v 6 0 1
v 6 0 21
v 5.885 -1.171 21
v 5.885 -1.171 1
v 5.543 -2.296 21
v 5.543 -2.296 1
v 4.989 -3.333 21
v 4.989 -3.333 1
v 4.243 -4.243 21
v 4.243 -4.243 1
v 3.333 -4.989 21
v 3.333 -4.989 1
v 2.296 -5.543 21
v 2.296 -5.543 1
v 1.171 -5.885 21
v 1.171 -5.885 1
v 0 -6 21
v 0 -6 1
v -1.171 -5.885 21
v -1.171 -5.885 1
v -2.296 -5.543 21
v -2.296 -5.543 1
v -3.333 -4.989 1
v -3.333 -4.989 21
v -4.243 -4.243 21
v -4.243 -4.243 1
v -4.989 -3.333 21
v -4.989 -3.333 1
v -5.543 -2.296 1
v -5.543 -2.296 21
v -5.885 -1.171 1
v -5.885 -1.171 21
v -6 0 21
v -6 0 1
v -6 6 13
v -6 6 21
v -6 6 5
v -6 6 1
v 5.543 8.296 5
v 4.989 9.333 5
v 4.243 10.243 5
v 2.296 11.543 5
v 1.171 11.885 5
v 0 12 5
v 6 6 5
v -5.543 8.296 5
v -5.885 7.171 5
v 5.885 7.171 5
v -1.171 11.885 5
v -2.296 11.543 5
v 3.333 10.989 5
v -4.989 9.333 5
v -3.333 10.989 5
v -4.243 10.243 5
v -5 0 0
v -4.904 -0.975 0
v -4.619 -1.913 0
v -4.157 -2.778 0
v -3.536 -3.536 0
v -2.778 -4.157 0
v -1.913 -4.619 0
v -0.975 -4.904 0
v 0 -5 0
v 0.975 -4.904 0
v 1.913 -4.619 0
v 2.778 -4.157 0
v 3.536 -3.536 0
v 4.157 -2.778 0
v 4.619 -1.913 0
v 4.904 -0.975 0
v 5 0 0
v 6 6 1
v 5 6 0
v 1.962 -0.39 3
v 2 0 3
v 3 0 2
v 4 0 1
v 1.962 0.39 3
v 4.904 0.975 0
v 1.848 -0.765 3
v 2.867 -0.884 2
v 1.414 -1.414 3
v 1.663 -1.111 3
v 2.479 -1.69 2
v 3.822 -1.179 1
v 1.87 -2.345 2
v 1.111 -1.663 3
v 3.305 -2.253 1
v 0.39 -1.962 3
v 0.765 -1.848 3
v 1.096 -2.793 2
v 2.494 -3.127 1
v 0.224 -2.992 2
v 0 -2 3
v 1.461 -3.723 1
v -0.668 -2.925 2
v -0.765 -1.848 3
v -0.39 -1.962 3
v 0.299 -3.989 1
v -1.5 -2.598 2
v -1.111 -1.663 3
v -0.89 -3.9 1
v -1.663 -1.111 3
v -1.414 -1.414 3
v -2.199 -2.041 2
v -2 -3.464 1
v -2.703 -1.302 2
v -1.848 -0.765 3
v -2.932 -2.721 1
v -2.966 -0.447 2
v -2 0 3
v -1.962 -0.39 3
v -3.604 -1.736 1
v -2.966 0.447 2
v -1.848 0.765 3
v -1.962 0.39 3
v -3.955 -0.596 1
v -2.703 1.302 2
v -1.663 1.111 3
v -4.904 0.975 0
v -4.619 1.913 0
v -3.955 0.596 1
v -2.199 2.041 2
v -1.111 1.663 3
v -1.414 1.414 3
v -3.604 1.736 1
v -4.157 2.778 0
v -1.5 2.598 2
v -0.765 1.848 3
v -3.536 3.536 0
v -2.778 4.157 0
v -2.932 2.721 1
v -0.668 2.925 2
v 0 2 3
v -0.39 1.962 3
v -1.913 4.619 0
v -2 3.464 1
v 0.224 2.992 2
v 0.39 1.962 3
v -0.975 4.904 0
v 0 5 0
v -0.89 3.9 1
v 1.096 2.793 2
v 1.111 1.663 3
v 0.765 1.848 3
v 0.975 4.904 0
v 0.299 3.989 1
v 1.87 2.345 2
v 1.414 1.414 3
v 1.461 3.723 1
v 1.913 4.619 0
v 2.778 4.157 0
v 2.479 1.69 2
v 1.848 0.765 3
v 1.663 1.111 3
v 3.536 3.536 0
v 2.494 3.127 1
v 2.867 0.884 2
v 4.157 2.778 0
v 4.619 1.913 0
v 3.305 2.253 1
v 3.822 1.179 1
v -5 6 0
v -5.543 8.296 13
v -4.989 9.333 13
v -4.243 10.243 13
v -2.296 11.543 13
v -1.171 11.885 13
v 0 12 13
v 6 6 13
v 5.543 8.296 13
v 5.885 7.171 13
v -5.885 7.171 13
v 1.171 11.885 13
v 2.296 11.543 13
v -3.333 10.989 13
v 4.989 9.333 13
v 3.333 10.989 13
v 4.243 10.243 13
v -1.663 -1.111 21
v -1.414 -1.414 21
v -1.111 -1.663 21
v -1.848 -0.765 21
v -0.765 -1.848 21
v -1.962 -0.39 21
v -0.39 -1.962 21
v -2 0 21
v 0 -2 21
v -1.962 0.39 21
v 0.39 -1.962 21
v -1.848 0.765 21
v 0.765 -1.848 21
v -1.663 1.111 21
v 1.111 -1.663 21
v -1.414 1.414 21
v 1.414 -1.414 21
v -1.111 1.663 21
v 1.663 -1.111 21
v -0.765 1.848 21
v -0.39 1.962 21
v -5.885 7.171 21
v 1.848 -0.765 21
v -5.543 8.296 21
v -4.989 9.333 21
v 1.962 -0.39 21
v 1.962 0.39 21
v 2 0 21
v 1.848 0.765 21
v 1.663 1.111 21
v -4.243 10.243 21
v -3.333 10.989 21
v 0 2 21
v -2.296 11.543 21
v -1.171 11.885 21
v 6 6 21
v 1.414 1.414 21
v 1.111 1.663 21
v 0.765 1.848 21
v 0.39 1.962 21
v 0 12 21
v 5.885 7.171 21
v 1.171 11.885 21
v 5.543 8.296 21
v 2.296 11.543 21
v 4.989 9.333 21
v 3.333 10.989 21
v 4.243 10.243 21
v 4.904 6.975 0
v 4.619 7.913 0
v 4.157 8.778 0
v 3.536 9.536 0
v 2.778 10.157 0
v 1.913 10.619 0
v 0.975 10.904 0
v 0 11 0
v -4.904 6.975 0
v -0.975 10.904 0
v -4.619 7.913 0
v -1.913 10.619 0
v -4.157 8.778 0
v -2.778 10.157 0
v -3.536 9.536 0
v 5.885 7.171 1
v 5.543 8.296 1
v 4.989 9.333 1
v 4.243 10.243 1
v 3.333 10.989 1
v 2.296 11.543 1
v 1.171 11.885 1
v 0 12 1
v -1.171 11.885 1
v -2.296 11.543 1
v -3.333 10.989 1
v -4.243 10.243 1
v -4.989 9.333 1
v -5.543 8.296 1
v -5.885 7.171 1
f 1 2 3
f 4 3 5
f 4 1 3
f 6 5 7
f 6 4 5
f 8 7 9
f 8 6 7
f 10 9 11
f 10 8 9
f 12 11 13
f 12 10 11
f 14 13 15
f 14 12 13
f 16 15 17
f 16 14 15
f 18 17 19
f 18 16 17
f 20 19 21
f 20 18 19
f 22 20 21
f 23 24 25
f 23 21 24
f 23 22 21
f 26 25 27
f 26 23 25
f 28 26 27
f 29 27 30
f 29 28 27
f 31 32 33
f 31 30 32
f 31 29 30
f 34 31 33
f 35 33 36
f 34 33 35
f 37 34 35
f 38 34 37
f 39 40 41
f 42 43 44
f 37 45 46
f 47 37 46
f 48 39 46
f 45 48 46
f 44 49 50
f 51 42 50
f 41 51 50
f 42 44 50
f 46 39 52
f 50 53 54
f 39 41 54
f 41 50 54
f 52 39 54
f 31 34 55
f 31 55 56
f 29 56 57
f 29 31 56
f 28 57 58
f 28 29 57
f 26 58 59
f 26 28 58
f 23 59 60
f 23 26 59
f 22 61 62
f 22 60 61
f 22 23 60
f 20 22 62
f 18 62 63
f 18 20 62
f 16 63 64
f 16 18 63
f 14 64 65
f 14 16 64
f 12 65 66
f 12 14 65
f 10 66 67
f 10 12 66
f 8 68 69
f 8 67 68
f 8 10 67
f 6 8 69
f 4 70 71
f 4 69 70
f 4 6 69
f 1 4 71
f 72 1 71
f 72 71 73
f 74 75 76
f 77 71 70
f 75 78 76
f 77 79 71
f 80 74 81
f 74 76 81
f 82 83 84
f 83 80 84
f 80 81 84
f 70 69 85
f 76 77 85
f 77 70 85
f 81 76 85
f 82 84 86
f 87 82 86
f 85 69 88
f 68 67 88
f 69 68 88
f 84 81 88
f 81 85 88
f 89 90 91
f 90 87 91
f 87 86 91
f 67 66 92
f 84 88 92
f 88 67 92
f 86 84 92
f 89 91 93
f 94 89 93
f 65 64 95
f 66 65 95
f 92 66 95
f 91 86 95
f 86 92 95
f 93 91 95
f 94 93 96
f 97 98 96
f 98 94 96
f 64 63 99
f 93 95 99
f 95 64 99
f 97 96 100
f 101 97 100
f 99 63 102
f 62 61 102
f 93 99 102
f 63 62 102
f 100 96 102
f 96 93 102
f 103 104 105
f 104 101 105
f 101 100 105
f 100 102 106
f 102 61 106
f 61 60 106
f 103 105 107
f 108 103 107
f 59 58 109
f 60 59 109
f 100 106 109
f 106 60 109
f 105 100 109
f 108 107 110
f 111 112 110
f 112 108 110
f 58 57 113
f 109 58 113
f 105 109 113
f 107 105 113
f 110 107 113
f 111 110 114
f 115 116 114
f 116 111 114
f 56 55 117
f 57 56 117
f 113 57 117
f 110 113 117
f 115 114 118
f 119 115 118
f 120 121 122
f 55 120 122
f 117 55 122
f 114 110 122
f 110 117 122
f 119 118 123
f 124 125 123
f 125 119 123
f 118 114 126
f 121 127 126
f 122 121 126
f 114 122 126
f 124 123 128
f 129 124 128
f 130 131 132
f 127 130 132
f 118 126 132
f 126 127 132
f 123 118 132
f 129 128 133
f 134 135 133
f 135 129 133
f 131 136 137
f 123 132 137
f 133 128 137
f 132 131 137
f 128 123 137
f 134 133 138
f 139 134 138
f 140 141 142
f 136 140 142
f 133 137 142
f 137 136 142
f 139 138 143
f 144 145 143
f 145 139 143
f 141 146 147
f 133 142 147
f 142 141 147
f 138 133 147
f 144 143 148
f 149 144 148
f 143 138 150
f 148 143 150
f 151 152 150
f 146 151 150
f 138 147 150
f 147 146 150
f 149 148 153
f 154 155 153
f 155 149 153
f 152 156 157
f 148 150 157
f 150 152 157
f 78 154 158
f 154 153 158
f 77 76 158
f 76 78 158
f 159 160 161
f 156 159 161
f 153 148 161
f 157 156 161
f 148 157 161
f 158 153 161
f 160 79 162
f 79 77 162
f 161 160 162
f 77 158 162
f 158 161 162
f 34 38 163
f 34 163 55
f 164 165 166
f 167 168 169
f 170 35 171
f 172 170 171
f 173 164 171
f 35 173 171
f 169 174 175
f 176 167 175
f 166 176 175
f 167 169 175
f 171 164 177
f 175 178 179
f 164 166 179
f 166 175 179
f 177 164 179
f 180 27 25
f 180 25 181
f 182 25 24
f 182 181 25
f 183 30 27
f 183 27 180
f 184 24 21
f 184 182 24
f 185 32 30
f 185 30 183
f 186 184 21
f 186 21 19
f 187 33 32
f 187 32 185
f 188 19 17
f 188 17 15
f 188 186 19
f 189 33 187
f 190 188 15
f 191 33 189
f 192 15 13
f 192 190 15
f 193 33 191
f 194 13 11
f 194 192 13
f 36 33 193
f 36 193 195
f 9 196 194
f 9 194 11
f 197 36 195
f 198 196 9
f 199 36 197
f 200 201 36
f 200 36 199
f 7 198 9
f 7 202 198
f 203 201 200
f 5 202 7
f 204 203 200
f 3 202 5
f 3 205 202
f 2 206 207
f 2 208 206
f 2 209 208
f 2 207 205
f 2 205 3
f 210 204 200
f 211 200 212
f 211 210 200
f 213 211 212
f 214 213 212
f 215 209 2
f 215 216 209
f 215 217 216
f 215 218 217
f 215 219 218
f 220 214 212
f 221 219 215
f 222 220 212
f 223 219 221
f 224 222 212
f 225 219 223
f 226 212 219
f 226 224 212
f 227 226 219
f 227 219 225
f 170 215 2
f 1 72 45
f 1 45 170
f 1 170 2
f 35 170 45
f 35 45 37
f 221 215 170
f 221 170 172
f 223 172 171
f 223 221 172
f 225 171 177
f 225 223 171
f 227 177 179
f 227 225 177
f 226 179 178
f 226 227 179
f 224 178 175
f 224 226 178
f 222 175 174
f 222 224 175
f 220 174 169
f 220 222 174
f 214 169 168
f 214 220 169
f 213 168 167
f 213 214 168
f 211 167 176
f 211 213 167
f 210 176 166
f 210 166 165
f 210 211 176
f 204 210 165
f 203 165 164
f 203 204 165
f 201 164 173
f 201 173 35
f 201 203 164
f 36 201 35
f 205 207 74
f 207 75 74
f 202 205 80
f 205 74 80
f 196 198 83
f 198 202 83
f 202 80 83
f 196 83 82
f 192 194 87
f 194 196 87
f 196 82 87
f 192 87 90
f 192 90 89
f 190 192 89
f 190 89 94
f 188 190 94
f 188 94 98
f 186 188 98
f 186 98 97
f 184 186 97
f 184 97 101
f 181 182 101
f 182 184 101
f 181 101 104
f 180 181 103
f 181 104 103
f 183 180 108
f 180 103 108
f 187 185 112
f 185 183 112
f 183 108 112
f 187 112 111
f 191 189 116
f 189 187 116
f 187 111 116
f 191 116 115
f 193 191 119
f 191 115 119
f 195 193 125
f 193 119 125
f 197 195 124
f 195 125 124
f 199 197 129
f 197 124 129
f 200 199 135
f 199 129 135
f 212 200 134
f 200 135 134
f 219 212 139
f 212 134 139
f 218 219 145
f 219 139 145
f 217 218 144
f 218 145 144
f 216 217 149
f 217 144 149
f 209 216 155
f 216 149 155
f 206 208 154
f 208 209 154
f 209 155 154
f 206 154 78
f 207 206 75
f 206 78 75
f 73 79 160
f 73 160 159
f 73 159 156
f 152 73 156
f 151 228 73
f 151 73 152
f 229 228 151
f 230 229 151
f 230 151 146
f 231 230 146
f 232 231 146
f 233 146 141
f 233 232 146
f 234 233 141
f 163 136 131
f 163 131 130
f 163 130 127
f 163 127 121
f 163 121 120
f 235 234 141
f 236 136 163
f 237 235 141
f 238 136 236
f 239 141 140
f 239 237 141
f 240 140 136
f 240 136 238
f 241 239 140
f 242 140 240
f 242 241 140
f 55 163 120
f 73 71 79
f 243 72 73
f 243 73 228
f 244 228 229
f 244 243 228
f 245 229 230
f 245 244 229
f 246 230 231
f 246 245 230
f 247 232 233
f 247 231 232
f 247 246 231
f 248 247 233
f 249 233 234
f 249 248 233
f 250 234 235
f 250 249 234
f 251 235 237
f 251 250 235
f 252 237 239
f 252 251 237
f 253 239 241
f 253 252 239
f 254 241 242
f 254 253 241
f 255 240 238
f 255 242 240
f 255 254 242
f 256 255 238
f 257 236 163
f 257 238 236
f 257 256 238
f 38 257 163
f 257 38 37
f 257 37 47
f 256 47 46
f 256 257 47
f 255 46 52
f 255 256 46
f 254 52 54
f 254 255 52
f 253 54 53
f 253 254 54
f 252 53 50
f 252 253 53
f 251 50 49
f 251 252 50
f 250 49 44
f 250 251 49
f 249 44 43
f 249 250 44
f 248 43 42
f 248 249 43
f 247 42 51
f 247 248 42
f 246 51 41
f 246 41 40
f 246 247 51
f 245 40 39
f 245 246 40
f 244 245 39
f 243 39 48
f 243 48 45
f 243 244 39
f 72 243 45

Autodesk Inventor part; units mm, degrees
ref_plane "YZ Plane" through (0, 0, 0) normal (1, 0, 0) x (0, 1, 0)
ref_plane "XZ Plane" through (0, 0, 0) normal (0, 1, 0) x (-1, 0, 0)
ref_plane "XY Plane" through (0, 0, 0) normal (0, 0, 1) x (1, 0, 0)
sketch "Sketch2" plane through (0, 0, 0) normal (0, 0, 1) x (1, 0, 0)
  circle A0 centre (0, 0) radius 6
  circle A1 centre (0, 0) radius 2
  dimension "d0" = 12
  dimension "d1" = 4
extrude "Extrusion1" add sketch "Sketch2" along normal blind 21
sketch "Sketch3" plane through (0, 0, 21) normal (0, 0, 1) x (1, 0, 0)
  line L0 (0, 0) -> (0, 6) construction
  line L1 (6, 0) -> (6, 6)
  line L2 (-6, 6) -> (-6, 0)
  arc A0 (-6, 0) -> (6, 0) centre (0, 0) ccw
  arc A1 (6, 6) -> (-6, 6) centre (0, 6) ccw
  circle A2 centre (0, 0) radius 2 projected
  circle A3 centre (0, 0) radius 6 projected
  circle A4 centre (0, 0) radius 2 projected
  circle A5 centre (0, 0) radius 6 projected
  point P0 (0, 3)
  dimension "d4" = 6
  dimension "d5" = 6
extrude "Extrusion2" add sketch "Sketch3" against normal blind 8 contours A3 L2 A1 L1
sketch "Sketch4" plane through (0, 0, 0) normal (0, 0, -1) x (-1, 0, 0)
  arc A0 (6, 6) -> (-6, 6) centre (0, 6) ccw projected
  line L0 (-6, 6) -> (-6, 0) projected
  line L1 (6, 0) -> (6, 6) projected
  arc A1 (6, 0) -> (-6, 0) centre (0, 0) ccw projected
  circle A2 centre (0, 0) radius 2 projected
extrude "Extrusion3" add sketch "Sketch4" against normal blind 5 contours L1 A1 L0 A0
sketch "Sketch5" plane through (0, 0, 13) normal (0, 0, -1) x (-1, 0, 0)
  arc A0 (6, 6) -> (-6, 6) centre (0, 6) ccw projected
  line L0 (-6, 6) -> (-6, 0) projected
  line L1 (6, 0) -> (6, 6) projected
  arc A1 (6, 0) -> (-6, 0) centre (0, 0) ccw projected
  line L2 (-6, 6) -> (6, 6)
  arc A2 (6, 0) -> (-6, 0) centre (0, 0) ccw projected
  point P0 (0, 6)
extrude "Extrusion4" add sketch "Sketch5" along normal blind 8.2 contours L1 A1 L2 | L2 A1 L0
chamfer "Chamfer1" distance 3 angle 45 1 edges at (-2, 0, 0)
chamfer "Chamfer2" distance 1 angle 45 4 edges at (-6, 3, 0) (0, 12, 0) (6, 3, 0) (0, -6, 0)
properties part number "picture-fixings-8mm"
